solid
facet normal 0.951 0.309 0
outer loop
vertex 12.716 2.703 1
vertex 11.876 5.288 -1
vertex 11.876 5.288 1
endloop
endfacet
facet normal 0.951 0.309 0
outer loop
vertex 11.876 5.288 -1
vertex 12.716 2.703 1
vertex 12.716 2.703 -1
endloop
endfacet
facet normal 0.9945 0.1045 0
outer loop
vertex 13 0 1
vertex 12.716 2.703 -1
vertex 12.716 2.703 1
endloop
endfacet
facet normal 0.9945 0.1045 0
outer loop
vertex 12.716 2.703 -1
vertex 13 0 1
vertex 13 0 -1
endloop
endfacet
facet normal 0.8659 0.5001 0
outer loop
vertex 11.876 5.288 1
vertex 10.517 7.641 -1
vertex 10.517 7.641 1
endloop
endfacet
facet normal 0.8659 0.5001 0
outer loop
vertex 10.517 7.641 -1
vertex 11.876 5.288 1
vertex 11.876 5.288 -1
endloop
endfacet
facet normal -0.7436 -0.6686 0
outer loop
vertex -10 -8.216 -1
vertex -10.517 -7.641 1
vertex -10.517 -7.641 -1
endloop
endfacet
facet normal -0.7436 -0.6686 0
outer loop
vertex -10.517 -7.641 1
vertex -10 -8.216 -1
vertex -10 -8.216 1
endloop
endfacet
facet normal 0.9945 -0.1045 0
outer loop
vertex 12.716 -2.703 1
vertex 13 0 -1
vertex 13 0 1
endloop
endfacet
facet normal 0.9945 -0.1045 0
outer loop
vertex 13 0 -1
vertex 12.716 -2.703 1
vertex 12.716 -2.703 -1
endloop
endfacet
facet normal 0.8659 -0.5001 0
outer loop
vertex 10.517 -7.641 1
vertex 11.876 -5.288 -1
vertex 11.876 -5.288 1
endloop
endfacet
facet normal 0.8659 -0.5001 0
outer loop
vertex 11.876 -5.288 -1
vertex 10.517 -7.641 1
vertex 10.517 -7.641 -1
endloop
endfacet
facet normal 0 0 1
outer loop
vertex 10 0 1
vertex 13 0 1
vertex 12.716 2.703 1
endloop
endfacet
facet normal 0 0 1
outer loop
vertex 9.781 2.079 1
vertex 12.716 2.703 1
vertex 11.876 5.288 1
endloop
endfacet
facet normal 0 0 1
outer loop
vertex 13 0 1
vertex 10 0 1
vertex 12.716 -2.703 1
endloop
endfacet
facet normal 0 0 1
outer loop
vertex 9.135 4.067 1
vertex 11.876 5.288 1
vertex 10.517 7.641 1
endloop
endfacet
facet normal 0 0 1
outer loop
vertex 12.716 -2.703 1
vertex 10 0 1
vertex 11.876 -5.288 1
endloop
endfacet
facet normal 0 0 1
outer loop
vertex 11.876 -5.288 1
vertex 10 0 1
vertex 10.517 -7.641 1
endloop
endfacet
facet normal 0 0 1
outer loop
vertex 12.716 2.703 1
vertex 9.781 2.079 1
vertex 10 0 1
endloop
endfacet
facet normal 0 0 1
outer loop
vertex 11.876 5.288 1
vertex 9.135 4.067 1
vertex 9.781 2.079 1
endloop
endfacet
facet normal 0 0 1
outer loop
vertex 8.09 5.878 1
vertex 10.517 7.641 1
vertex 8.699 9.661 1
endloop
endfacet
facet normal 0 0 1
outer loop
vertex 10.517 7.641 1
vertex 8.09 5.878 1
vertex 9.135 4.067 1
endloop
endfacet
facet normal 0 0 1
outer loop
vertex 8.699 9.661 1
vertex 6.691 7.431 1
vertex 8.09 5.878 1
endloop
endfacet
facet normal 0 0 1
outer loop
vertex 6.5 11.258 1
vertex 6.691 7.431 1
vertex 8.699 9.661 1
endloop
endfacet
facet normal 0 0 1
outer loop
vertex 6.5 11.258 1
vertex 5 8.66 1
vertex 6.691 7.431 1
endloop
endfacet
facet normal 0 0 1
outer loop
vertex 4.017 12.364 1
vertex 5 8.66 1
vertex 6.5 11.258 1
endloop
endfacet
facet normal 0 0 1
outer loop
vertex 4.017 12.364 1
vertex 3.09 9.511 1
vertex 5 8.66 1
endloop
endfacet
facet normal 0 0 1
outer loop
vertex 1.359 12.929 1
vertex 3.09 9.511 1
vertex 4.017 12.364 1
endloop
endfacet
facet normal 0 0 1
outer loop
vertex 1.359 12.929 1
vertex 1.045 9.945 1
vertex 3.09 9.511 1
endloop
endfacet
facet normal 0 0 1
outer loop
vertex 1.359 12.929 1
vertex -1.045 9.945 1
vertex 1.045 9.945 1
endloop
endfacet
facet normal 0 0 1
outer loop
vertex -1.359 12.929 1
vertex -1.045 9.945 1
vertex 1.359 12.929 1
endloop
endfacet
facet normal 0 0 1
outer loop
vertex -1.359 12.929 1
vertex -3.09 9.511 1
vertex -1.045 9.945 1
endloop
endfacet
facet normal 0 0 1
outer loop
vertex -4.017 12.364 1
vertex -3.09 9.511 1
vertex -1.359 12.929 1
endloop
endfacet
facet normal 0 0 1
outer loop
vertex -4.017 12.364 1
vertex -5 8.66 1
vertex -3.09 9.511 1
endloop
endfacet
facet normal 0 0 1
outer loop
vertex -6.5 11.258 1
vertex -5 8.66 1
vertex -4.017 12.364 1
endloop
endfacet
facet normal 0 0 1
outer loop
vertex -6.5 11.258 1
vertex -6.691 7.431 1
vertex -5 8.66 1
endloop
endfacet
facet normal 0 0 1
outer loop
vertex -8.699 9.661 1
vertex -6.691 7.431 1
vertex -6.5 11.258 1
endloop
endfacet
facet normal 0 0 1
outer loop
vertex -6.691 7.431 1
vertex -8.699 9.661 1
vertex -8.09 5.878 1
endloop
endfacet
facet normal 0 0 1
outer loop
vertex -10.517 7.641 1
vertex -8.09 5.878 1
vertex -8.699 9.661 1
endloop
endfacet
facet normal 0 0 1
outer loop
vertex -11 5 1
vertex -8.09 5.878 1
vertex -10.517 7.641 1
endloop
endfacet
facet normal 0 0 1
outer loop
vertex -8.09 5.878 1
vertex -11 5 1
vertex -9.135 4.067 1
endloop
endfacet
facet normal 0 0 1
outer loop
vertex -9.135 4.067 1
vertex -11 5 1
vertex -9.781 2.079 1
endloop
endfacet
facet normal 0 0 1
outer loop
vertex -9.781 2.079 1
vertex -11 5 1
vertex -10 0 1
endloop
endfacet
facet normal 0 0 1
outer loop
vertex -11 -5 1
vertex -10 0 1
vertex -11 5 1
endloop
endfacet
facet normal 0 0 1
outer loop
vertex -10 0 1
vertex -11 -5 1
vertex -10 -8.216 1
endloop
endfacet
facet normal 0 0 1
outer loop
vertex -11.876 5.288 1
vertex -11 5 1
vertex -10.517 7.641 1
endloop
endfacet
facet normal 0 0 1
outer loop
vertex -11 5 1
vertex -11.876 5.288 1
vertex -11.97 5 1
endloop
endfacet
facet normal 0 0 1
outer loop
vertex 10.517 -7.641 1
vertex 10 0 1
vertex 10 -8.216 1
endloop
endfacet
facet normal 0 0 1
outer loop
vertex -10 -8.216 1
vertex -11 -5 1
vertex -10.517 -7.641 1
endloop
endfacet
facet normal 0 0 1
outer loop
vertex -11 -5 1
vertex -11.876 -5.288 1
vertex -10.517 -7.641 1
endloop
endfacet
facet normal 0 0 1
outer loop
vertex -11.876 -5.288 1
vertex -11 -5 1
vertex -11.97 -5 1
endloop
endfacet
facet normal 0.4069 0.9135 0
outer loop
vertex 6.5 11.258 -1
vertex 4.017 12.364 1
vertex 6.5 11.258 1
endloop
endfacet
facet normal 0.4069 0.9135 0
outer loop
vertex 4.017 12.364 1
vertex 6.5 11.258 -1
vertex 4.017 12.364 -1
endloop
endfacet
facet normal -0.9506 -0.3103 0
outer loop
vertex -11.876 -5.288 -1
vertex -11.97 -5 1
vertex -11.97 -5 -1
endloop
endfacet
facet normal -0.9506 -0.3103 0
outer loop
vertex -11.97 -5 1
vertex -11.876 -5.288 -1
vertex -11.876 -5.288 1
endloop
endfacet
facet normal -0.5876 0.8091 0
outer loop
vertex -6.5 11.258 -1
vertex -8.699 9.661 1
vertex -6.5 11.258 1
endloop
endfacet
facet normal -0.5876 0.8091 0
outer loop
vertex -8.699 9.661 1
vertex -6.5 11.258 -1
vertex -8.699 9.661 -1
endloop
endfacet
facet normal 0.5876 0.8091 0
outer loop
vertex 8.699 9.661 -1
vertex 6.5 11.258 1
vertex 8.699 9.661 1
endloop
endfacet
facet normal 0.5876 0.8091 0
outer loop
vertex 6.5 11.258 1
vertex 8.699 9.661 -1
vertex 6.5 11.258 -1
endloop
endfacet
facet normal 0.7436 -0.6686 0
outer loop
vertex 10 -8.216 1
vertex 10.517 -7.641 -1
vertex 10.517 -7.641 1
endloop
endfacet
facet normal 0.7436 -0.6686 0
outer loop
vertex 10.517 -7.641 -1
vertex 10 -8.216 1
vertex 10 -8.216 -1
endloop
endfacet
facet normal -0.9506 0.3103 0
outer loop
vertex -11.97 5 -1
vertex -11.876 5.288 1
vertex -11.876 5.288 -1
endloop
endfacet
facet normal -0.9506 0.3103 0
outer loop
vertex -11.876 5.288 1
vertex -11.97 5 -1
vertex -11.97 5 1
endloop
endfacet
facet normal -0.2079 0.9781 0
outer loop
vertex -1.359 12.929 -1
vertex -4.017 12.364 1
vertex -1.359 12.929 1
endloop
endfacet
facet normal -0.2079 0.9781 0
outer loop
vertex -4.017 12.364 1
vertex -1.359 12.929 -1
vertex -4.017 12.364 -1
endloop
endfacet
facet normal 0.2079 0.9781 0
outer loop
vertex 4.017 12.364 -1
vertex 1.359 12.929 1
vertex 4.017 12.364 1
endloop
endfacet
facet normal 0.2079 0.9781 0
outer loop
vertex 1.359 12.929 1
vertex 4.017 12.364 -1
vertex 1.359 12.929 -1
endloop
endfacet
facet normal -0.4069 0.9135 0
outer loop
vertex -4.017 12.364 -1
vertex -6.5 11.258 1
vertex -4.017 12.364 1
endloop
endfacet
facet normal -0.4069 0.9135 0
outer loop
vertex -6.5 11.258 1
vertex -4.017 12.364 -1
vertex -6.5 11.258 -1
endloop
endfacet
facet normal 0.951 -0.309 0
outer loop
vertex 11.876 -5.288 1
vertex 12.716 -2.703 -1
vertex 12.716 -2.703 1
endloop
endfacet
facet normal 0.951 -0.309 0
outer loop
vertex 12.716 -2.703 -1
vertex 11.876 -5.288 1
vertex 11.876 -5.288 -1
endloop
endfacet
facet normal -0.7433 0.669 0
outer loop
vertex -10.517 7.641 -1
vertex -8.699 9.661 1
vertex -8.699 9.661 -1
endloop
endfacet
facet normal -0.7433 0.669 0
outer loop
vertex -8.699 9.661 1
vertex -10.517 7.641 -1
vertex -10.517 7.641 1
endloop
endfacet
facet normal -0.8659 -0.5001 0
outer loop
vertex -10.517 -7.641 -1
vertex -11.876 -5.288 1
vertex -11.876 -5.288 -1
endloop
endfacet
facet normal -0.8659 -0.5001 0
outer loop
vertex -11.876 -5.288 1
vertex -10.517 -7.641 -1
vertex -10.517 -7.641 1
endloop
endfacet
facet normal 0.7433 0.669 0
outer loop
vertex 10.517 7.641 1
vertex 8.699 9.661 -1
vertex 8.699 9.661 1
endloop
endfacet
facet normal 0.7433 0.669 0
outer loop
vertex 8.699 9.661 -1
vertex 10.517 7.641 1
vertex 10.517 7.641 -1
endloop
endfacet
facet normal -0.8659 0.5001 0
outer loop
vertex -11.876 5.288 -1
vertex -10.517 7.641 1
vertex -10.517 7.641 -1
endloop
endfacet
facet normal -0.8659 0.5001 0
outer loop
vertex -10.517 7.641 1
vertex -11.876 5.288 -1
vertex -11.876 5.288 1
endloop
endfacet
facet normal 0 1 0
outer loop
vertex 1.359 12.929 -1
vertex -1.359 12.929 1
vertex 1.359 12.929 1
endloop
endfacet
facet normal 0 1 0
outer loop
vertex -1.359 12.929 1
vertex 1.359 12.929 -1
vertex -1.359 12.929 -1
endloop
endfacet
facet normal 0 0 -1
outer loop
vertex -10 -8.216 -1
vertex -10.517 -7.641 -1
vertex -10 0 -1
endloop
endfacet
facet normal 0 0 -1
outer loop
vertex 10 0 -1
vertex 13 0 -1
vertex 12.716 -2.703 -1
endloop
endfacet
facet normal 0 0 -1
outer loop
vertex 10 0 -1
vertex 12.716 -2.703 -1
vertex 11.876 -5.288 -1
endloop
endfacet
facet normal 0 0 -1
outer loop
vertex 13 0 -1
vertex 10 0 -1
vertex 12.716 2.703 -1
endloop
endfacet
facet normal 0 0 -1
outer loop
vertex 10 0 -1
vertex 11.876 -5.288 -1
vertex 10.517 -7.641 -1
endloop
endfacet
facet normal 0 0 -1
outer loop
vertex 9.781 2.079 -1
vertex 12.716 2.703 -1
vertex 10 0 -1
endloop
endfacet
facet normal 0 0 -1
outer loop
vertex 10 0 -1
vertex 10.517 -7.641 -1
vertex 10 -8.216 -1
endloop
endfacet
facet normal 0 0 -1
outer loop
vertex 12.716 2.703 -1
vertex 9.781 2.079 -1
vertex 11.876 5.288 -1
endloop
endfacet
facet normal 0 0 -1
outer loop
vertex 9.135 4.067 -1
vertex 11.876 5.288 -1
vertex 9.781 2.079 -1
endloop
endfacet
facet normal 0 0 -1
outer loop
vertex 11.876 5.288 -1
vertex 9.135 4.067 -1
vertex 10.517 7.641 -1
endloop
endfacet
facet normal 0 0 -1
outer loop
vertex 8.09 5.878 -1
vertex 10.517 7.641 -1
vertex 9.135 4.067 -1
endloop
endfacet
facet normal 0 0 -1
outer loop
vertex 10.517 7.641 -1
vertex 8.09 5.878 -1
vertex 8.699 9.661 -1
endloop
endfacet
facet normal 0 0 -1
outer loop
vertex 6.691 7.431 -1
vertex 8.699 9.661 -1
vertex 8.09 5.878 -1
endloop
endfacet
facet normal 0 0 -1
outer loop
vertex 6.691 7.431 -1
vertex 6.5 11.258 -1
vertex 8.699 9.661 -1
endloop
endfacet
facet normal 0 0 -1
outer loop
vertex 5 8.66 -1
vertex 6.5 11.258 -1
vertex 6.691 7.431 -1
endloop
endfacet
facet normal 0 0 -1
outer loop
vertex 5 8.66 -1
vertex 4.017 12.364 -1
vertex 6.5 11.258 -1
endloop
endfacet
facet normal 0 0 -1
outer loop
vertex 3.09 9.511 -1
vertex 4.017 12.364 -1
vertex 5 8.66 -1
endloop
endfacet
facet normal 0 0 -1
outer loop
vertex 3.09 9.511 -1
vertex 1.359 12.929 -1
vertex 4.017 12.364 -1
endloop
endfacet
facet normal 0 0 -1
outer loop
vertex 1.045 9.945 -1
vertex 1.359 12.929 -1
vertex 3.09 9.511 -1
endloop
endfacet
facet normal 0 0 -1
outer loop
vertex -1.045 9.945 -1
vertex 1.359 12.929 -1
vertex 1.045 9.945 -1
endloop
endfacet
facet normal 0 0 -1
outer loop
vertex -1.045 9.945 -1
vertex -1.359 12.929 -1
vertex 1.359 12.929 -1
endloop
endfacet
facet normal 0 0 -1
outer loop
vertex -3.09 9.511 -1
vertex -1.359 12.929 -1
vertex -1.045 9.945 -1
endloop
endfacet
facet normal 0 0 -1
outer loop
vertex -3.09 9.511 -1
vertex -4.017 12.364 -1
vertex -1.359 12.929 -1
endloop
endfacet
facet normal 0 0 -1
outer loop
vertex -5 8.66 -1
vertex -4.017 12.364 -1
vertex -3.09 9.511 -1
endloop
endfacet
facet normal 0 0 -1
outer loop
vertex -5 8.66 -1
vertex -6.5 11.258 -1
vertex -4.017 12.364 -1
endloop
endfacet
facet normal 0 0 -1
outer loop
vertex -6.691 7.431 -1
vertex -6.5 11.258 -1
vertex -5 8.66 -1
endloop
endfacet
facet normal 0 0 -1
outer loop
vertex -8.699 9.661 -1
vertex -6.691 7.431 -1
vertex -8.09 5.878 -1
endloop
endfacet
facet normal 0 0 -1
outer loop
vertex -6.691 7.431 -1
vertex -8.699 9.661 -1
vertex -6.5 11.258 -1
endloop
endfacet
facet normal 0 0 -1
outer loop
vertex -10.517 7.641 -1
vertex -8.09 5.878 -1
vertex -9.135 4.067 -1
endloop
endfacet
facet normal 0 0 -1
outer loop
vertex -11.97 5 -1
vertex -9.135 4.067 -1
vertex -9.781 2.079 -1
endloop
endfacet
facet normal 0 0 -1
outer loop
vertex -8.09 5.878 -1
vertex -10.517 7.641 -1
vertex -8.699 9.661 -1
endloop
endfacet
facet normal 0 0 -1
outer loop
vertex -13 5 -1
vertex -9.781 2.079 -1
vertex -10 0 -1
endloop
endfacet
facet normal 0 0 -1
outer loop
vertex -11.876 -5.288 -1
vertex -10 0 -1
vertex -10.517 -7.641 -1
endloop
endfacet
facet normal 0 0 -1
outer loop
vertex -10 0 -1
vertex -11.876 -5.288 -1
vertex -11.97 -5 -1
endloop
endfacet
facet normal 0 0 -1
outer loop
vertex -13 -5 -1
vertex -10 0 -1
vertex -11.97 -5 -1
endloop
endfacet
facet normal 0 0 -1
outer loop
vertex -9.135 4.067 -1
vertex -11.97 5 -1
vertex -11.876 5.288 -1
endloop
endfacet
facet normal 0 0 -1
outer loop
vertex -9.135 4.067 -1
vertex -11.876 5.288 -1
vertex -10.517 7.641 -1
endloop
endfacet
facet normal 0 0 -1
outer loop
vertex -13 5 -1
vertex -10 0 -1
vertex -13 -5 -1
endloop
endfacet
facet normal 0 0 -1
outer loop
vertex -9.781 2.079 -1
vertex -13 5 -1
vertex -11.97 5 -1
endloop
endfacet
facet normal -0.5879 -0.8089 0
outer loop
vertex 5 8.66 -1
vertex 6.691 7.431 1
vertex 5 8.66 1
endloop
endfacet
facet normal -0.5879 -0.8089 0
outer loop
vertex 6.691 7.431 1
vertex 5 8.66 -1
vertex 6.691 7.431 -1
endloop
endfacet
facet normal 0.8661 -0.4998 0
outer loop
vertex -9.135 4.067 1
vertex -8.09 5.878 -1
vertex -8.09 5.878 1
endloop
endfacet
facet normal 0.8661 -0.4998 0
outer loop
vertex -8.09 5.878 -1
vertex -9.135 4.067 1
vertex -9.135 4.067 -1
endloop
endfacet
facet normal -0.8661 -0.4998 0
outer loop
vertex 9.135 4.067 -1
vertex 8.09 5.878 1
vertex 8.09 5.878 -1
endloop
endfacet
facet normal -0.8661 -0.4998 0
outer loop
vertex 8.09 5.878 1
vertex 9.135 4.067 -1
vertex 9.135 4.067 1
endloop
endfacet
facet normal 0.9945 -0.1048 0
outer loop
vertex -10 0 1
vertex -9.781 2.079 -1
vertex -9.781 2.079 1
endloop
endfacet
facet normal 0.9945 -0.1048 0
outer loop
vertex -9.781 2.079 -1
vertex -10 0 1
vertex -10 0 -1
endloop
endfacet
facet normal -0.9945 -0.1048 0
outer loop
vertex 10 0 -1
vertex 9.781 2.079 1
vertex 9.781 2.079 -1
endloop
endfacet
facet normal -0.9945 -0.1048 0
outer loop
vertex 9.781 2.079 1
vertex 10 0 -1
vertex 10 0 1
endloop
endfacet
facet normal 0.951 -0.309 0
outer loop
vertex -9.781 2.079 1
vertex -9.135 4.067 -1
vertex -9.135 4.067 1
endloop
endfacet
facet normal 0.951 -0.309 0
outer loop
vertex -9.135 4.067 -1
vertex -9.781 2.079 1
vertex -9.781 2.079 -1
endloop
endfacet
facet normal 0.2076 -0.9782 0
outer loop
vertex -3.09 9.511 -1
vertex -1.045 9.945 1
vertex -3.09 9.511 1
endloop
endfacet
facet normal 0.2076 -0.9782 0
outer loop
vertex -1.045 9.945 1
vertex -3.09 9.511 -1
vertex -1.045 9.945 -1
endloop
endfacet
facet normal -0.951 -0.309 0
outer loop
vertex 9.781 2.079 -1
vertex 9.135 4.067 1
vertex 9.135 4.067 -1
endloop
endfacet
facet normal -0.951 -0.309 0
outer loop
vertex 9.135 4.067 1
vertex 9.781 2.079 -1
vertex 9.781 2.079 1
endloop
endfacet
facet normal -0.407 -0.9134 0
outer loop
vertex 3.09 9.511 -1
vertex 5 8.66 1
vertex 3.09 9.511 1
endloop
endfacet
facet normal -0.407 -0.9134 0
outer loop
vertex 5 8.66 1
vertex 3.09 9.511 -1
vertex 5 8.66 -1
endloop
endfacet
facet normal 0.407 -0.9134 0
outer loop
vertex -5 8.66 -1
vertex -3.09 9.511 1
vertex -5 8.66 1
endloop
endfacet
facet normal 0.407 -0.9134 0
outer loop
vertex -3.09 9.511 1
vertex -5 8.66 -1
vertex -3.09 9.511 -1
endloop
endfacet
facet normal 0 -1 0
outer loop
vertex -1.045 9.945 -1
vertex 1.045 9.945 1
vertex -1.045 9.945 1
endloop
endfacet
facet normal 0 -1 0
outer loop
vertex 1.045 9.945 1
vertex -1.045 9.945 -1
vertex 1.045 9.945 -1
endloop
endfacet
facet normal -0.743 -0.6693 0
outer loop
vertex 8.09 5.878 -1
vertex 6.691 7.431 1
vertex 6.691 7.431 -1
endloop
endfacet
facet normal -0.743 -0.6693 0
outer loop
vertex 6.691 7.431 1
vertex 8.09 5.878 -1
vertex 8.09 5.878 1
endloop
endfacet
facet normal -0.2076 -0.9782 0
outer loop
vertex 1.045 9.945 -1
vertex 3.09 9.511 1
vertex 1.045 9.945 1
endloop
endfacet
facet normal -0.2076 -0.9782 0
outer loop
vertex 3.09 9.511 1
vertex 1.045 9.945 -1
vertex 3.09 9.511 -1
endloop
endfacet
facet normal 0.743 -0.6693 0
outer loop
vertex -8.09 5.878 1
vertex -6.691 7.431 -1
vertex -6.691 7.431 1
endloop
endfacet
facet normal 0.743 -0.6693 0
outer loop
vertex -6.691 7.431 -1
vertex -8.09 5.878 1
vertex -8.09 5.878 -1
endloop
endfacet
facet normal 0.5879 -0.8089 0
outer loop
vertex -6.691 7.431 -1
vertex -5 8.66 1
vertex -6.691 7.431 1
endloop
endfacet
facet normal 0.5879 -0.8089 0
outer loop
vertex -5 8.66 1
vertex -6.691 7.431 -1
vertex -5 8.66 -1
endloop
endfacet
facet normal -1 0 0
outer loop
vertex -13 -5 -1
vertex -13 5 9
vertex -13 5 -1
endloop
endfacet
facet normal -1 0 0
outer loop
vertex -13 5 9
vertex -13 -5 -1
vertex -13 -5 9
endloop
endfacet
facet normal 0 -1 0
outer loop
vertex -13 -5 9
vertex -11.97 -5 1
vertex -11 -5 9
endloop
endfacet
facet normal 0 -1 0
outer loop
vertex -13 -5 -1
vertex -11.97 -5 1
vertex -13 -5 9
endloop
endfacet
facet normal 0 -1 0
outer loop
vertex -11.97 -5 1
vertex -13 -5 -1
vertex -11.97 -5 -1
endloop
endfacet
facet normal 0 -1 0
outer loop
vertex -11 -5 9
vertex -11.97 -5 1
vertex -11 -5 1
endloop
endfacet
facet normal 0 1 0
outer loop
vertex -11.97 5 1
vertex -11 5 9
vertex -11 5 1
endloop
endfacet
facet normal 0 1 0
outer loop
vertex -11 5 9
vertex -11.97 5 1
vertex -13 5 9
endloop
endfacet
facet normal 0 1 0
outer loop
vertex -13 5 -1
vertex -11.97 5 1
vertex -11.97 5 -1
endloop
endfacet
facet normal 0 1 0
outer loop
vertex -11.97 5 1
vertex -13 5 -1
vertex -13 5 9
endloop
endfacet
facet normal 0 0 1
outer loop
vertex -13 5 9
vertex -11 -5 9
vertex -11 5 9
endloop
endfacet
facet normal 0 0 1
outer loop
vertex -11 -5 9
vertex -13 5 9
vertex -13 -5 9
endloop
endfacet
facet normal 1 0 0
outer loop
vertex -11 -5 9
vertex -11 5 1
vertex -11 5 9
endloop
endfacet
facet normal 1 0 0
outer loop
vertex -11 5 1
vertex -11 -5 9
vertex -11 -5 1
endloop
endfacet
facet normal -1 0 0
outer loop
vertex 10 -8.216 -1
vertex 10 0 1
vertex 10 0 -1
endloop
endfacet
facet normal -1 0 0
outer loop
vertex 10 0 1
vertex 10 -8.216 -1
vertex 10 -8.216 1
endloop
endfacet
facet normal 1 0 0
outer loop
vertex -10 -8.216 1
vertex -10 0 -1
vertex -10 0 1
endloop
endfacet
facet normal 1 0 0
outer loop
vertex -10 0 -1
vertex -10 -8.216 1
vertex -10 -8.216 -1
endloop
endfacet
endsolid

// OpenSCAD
// A kitchen hook thingie
// by Cristian Sandu

hook_dia = 20; // mm
hook_width = 2;
hook_depth = 3;

module hook() {
  difference() {
    cylinder(r = hook_dia / 2 + hook_depth, h = hook_width, center=true);
    cylinder(r = hook_dia / 2, h = hook_width + hook_depth , center=true);
  }
}

module base() {
   translate([-hook_dia / 2 - hook_depth / 1.5, 0, hook_width * 2]) {
    rotate([90, 0, 0]) {
      cube(size=[hook_width, hook_dia / 2, hook_width * 5], center=true);
    }
  }
}

difference() {
  union() {
    base();
    hook();
  }

  translate([0, -hook_dia / 2, 0]) {
    cube(size=[hook_dia, hook_dia, hook_width * 2], center=true);
  }
}
